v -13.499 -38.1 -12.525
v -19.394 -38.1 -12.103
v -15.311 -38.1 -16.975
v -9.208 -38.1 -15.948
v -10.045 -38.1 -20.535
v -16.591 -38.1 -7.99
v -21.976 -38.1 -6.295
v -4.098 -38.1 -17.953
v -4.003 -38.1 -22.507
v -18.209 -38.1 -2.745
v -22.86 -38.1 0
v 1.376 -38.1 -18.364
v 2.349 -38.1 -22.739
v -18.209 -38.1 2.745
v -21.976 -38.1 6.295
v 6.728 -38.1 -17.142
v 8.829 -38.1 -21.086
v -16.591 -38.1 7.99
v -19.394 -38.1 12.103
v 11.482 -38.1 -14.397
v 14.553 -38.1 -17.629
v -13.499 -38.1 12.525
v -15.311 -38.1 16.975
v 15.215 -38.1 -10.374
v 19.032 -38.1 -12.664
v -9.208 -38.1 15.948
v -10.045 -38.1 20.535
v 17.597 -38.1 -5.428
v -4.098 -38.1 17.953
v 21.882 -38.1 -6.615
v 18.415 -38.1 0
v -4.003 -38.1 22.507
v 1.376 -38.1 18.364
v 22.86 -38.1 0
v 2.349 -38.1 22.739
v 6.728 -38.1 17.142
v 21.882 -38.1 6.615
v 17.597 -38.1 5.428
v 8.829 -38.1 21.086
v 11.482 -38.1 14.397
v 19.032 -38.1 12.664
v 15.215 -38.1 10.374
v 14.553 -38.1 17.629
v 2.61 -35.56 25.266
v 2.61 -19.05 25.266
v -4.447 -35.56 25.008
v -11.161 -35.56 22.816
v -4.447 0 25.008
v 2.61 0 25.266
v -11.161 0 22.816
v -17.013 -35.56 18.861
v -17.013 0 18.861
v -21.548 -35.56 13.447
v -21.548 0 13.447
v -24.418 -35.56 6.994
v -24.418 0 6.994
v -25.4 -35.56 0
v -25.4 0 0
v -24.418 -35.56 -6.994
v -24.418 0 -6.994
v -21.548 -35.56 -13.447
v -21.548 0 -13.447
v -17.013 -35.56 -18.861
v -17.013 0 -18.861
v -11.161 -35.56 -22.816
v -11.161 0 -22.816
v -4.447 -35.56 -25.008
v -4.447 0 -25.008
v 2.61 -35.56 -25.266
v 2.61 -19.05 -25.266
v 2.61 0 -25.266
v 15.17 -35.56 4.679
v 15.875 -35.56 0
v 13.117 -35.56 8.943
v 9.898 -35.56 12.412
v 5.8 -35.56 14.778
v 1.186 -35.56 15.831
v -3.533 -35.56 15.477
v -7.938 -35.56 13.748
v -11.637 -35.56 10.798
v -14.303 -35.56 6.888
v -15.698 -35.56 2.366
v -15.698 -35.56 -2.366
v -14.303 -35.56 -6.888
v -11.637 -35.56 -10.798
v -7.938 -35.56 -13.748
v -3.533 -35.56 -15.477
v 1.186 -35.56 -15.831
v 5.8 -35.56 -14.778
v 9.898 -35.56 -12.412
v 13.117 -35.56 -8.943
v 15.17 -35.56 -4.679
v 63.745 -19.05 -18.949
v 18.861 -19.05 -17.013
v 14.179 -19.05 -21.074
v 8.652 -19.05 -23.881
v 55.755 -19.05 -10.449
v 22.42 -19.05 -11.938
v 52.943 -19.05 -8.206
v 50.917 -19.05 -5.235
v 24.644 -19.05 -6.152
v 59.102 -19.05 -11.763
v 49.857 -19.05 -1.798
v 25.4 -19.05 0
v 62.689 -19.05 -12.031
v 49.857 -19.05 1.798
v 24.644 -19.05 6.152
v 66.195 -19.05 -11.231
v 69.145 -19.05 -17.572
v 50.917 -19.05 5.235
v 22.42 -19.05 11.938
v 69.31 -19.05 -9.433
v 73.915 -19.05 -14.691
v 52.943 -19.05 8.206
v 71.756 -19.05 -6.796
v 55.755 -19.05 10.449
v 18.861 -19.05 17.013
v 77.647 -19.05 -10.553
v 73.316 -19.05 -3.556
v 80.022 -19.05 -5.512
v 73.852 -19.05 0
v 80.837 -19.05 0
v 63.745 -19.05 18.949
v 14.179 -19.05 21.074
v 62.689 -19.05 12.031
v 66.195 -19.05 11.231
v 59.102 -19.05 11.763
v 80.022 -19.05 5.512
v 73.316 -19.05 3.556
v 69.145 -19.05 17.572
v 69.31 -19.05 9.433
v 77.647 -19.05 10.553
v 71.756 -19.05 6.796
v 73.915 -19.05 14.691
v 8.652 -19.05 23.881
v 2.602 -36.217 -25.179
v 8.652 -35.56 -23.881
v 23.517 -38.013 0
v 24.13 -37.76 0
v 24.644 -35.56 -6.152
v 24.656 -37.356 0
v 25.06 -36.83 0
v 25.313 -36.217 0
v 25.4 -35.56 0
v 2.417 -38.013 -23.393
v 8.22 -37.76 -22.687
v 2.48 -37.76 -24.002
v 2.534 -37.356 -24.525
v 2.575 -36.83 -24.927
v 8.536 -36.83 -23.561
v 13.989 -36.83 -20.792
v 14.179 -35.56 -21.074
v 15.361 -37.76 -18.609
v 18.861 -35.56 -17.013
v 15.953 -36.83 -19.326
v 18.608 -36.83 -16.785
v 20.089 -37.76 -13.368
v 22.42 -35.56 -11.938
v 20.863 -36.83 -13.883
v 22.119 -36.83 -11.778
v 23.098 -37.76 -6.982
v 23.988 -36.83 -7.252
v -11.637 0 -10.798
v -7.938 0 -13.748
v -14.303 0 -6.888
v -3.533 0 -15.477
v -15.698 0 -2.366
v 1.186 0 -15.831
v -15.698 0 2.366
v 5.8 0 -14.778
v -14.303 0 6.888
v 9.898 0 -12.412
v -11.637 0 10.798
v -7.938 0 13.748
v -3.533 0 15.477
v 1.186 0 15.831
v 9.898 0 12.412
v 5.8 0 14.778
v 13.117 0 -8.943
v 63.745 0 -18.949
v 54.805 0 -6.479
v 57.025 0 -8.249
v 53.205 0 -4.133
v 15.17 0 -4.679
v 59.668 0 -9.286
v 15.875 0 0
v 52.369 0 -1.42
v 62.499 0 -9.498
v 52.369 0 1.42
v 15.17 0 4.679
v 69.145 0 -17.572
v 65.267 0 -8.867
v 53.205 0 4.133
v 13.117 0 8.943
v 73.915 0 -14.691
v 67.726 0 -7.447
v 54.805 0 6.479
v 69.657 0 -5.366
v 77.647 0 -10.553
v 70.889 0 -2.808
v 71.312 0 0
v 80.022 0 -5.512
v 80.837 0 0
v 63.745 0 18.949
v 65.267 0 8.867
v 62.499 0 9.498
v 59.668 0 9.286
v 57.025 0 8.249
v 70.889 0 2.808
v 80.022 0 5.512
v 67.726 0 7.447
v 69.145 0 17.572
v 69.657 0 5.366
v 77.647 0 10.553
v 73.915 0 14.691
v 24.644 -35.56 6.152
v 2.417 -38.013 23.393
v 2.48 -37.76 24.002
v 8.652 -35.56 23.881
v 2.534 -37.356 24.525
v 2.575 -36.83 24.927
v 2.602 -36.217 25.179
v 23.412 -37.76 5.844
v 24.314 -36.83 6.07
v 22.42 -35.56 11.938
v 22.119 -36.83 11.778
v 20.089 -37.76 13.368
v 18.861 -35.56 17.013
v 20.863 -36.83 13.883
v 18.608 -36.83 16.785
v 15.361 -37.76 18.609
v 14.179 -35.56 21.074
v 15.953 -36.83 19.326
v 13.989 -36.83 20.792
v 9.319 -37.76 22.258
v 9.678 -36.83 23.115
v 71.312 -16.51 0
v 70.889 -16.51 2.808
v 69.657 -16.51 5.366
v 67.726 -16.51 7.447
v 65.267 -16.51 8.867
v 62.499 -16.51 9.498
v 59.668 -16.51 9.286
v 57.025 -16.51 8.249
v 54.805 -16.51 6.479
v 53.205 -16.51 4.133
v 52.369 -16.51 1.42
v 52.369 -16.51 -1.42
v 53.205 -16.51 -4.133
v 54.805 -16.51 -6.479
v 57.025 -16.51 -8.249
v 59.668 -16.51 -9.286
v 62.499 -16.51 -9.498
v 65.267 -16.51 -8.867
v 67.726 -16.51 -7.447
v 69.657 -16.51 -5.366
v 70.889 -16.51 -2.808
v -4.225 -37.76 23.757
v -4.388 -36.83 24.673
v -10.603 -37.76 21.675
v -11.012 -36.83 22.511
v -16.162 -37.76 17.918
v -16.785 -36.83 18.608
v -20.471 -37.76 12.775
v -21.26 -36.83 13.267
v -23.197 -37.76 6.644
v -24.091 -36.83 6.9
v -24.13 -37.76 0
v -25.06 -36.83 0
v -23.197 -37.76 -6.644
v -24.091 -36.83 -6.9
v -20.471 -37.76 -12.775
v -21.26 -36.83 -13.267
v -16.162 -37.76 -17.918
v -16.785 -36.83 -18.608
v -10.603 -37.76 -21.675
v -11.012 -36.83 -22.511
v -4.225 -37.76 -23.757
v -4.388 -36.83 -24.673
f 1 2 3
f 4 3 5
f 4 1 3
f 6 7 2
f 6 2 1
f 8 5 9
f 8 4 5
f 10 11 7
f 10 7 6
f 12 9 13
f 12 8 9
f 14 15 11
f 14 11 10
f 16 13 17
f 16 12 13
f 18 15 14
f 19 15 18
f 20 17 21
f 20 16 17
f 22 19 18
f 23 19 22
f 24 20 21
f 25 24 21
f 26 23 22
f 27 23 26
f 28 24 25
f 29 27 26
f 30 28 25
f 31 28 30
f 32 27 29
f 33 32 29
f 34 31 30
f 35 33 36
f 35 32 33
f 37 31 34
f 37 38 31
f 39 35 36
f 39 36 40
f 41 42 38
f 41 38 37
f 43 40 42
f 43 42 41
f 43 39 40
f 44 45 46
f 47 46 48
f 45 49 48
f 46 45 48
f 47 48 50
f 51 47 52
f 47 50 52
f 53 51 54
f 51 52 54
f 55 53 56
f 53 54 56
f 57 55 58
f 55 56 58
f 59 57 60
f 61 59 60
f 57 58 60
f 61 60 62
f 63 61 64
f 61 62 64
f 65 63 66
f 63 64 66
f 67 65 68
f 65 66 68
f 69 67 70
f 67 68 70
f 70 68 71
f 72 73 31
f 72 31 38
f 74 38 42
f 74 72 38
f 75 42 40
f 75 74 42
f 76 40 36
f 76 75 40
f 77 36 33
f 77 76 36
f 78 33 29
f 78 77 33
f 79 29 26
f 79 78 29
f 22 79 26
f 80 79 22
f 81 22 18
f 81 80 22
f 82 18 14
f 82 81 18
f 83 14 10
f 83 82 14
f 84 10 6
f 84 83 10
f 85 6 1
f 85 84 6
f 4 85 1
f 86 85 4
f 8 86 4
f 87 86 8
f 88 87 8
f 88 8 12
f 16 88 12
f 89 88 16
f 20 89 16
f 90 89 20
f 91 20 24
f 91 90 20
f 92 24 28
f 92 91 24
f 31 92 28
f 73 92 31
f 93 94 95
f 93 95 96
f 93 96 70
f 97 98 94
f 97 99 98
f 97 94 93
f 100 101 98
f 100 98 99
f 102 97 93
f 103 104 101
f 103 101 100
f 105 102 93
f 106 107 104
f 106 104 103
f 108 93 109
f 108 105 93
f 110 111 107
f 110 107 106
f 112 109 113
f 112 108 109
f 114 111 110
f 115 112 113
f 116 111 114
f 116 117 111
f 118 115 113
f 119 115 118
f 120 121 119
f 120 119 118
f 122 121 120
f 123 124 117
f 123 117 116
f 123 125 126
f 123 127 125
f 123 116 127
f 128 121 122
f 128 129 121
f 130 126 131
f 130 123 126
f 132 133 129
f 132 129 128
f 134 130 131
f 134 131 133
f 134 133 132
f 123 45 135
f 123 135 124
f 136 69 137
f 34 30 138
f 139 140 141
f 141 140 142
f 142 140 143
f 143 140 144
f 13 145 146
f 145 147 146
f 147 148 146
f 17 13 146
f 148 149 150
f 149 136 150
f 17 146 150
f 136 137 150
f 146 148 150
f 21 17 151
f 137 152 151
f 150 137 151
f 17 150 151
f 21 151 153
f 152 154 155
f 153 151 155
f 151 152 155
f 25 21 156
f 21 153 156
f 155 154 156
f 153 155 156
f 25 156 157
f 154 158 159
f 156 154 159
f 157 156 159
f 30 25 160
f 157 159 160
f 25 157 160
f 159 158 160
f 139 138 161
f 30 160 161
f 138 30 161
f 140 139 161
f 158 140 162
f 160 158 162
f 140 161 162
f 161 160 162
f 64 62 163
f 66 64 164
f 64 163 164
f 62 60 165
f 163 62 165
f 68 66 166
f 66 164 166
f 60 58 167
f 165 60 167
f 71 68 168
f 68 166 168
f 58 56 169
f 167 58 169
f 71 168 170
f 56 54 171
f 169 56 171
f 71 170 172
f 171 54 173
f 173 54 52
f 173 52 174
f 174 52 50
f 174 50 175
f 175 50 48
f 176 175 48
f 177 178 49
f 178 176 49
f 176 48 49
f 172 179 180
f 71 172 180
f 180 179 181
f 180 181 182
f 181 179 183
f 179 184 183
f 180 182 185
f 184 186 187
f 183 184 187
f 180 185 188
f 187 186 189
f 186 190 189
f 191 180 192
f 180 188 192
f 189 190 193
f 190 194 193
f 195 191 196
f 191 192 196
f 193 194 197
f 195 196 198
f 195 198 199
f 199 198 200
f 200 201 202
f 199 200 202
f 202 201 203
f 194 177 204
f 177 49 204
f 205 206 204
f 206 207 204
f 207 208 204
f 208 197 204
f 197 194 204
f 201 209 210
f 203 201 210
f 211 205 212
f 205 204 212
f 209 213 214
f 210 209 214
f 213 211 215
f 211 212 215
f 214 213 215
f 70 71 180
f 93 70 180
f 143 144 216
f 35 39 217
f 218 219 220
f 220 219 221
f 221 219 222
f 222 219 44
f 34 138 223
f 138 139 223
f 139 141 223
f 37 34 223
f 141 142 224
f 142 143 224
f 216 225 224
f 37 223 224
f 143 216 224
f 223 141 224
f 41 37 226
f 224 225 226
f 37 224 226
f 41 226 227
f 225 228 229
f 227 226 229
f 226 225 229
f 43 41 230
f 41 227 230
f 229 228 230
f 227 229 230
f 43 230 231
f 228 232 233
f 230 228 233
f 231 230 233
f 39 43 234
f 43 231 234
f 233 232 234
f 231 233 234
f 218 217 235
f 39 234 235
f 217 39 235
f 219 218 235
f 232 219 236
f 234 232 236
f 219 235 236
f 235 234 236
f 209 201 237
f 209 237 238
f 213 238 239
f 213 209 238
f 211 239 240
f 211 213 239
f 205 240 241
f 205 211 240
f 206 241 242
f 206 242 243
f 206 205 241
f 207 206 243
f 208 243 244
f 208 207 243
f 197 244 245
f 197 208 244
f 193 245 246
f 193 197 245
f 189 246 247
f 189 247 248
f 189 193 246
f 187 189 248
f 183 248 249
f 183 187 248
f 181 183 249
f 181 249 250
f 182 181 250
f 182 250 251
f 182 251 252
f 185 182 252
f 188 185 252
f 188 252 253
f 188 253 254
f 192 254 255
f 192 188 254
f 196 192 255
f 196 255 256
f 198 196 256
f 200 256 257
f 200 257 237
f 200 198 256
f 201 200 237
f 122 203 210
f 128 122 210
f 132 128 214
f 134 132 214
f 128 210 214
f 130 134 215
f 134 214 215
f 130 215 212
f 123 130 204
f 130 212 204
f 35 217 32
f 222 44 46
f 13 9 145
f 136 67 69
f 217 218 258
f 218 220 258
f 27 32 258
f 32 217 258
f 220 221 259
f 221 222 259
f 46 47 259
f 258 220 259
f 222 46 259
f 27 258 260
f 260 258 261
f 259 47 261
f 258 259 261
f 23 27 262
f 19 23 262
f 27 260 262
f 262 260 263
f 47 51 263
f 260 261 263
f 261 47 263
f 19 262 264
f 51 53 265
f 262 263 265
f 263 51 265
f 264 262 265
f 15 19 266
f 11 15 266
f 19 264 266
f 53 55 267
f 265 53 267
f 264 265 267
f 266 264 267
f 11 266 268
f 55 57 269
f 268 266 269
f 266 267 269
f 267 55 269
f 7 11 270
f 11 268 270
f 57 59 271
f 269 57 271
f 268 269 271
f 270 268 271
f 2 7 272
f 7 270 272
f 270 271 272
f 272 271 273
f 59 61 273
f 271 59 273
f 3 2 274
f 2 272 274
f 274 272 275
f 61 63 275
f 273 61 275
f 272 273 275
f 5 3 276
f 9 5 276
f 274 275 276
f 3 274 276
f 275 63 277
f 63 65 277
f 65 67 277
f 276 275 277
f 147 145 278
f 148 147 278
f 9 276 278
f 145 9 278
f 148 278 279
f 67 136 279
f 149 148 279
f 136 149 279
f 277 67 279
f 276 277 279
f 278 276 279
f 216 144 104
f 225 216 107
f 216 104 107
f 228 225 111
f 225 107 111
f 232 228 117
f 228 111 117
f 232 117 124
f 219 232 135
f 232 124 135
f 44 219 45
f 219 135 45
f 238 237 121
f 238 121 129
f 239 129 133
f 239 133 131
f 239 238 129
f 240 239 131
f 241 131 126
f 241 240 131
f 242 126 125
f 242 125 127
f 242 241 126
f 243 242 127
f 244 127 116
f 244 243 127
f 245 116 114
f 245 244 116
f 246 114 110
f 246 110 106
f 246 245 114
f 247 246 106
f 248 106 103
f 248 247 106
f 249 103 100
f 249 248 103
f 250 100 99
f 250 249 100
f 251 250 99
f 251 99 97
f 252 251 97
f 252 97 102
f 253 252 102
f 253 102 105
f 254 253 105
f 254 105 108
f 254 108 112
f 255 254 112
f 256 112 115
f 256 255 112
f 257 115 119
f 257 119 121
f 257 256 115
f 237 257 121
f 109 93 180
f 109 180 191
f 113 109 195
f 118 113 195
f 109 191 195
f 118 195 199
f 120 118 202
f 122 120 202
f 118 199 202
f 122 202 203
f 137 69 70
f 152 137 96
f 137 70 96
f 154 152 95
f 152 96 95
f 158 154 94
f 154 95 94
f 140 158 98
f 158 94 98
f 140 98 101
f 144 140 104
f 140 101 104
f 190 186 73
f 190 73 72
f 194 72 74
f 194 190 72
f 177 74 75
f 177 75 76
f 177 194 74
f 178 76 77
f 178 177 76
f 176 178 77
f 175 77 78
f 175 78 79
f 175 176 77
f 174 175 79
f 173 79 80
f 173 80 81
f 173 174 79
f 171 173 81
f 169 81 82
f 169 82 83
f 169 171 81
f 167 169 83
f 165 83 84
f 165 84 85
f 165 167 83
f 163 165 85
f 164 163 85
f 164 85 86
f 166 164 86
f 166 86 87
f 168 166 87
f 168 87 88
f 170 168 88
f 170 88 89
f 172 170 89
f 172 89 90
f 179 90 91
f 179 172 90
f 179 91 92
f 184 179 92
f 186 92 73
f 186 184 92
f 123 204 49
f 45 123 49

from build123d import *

# Parameters (mm, degrees)
F0_R     = 15.875
F1_DEPTH = 38.1
F0_R_2   = 9.525
F2_DEPTH = 19.05
F3_R     = 2.54
F4_SIZE  = 2.54


with BuildPart() as f1:
    # F0 (on Front) → F1 (new body)
    with BuildSketch(Plane.XZ):
        with BuildLine():
            ThreePointArc((2.610413, -25.265505), (18.860866, -17.012576), (25.4, 0))
            ThreePointArc((25.4, 0), (18.860866, 17.012576), (2.610413, 25.265505))
            ThreePointArc((2.610413, 25.265505), (-25.4, 0), (2.610413, -25.265505))
        make_face()
        Circle(F0_R, mode=Mode.SUBTRACT)
    extrude(amount=F1_DEPTH)

    # F0 (on Front) → F2 (join)
    with BuildSketch(Plane.XZ):
        with BuildLine():
            ThreePointArc((2.610413, -25.265505), (18.860866, -17.012576), (25.4, 0))
            ThreePointArc((25.4, 0), (18.860866, 17.012576), (2.610413, 25.265505))
            ThreePointArc((2.610413, 25.265505), (-25.4, 0), (2.610413, -25.265505))
        make_face()
        Circle(F0_R, mode=Mode.SUBTRACT)
        with BuildLine():
            ThreePointArc((2.610413, 25.265505), (18.860866, 17.012576), (25.4, 0))
            ThreePointArc((25.4, 0), (18.860866, -17.012576), (2.610413, -25.265505))
            Line((2.610413, -25.265505), (63.744959, -18.949129))
            ThreePointArc((63.744959, -18.949129), (42.737149, 0), (63.744959, 18.949129))
            Line((63.744959, 18.949129), (2.610413, 25.265505))
        make_face()
        with BuildLine():
            ThreePointArc((80.837149, 0), (75.932798, 12.759432), (63.744959, 18.949129))
            ThreePointArc((63.744959, 18.949129), (42.737149, 0), (63.744959, -18.949129))
            ThreePointArc((63.744959, -18.949129), (75.932798, -12.759432), (80.837149, 0))
        make_face()
        with Locations((61.787149, 0)):
            Circle(F0_R_2, mode=Mode.SUBTRACT)
    extrude(amount=F2_DEPTH)

    # F3
    f3_edges = [f1.edges().sort_by_distance(p)[0] for p in [
        (-2.610413, -38.1, 25.265505),
    ]]
    fillet(f3_edges, radius=F3_R)

    # F4
    f4_edges = [f1.edges().sort_by_distance(p)[0] for p in [
        (-15.875, -38.1, 0),
        (52.262149, -19.05, 0),
    ]]
    chamfer(f4_edges, length=F4_SIZE)


solid = f1.part
